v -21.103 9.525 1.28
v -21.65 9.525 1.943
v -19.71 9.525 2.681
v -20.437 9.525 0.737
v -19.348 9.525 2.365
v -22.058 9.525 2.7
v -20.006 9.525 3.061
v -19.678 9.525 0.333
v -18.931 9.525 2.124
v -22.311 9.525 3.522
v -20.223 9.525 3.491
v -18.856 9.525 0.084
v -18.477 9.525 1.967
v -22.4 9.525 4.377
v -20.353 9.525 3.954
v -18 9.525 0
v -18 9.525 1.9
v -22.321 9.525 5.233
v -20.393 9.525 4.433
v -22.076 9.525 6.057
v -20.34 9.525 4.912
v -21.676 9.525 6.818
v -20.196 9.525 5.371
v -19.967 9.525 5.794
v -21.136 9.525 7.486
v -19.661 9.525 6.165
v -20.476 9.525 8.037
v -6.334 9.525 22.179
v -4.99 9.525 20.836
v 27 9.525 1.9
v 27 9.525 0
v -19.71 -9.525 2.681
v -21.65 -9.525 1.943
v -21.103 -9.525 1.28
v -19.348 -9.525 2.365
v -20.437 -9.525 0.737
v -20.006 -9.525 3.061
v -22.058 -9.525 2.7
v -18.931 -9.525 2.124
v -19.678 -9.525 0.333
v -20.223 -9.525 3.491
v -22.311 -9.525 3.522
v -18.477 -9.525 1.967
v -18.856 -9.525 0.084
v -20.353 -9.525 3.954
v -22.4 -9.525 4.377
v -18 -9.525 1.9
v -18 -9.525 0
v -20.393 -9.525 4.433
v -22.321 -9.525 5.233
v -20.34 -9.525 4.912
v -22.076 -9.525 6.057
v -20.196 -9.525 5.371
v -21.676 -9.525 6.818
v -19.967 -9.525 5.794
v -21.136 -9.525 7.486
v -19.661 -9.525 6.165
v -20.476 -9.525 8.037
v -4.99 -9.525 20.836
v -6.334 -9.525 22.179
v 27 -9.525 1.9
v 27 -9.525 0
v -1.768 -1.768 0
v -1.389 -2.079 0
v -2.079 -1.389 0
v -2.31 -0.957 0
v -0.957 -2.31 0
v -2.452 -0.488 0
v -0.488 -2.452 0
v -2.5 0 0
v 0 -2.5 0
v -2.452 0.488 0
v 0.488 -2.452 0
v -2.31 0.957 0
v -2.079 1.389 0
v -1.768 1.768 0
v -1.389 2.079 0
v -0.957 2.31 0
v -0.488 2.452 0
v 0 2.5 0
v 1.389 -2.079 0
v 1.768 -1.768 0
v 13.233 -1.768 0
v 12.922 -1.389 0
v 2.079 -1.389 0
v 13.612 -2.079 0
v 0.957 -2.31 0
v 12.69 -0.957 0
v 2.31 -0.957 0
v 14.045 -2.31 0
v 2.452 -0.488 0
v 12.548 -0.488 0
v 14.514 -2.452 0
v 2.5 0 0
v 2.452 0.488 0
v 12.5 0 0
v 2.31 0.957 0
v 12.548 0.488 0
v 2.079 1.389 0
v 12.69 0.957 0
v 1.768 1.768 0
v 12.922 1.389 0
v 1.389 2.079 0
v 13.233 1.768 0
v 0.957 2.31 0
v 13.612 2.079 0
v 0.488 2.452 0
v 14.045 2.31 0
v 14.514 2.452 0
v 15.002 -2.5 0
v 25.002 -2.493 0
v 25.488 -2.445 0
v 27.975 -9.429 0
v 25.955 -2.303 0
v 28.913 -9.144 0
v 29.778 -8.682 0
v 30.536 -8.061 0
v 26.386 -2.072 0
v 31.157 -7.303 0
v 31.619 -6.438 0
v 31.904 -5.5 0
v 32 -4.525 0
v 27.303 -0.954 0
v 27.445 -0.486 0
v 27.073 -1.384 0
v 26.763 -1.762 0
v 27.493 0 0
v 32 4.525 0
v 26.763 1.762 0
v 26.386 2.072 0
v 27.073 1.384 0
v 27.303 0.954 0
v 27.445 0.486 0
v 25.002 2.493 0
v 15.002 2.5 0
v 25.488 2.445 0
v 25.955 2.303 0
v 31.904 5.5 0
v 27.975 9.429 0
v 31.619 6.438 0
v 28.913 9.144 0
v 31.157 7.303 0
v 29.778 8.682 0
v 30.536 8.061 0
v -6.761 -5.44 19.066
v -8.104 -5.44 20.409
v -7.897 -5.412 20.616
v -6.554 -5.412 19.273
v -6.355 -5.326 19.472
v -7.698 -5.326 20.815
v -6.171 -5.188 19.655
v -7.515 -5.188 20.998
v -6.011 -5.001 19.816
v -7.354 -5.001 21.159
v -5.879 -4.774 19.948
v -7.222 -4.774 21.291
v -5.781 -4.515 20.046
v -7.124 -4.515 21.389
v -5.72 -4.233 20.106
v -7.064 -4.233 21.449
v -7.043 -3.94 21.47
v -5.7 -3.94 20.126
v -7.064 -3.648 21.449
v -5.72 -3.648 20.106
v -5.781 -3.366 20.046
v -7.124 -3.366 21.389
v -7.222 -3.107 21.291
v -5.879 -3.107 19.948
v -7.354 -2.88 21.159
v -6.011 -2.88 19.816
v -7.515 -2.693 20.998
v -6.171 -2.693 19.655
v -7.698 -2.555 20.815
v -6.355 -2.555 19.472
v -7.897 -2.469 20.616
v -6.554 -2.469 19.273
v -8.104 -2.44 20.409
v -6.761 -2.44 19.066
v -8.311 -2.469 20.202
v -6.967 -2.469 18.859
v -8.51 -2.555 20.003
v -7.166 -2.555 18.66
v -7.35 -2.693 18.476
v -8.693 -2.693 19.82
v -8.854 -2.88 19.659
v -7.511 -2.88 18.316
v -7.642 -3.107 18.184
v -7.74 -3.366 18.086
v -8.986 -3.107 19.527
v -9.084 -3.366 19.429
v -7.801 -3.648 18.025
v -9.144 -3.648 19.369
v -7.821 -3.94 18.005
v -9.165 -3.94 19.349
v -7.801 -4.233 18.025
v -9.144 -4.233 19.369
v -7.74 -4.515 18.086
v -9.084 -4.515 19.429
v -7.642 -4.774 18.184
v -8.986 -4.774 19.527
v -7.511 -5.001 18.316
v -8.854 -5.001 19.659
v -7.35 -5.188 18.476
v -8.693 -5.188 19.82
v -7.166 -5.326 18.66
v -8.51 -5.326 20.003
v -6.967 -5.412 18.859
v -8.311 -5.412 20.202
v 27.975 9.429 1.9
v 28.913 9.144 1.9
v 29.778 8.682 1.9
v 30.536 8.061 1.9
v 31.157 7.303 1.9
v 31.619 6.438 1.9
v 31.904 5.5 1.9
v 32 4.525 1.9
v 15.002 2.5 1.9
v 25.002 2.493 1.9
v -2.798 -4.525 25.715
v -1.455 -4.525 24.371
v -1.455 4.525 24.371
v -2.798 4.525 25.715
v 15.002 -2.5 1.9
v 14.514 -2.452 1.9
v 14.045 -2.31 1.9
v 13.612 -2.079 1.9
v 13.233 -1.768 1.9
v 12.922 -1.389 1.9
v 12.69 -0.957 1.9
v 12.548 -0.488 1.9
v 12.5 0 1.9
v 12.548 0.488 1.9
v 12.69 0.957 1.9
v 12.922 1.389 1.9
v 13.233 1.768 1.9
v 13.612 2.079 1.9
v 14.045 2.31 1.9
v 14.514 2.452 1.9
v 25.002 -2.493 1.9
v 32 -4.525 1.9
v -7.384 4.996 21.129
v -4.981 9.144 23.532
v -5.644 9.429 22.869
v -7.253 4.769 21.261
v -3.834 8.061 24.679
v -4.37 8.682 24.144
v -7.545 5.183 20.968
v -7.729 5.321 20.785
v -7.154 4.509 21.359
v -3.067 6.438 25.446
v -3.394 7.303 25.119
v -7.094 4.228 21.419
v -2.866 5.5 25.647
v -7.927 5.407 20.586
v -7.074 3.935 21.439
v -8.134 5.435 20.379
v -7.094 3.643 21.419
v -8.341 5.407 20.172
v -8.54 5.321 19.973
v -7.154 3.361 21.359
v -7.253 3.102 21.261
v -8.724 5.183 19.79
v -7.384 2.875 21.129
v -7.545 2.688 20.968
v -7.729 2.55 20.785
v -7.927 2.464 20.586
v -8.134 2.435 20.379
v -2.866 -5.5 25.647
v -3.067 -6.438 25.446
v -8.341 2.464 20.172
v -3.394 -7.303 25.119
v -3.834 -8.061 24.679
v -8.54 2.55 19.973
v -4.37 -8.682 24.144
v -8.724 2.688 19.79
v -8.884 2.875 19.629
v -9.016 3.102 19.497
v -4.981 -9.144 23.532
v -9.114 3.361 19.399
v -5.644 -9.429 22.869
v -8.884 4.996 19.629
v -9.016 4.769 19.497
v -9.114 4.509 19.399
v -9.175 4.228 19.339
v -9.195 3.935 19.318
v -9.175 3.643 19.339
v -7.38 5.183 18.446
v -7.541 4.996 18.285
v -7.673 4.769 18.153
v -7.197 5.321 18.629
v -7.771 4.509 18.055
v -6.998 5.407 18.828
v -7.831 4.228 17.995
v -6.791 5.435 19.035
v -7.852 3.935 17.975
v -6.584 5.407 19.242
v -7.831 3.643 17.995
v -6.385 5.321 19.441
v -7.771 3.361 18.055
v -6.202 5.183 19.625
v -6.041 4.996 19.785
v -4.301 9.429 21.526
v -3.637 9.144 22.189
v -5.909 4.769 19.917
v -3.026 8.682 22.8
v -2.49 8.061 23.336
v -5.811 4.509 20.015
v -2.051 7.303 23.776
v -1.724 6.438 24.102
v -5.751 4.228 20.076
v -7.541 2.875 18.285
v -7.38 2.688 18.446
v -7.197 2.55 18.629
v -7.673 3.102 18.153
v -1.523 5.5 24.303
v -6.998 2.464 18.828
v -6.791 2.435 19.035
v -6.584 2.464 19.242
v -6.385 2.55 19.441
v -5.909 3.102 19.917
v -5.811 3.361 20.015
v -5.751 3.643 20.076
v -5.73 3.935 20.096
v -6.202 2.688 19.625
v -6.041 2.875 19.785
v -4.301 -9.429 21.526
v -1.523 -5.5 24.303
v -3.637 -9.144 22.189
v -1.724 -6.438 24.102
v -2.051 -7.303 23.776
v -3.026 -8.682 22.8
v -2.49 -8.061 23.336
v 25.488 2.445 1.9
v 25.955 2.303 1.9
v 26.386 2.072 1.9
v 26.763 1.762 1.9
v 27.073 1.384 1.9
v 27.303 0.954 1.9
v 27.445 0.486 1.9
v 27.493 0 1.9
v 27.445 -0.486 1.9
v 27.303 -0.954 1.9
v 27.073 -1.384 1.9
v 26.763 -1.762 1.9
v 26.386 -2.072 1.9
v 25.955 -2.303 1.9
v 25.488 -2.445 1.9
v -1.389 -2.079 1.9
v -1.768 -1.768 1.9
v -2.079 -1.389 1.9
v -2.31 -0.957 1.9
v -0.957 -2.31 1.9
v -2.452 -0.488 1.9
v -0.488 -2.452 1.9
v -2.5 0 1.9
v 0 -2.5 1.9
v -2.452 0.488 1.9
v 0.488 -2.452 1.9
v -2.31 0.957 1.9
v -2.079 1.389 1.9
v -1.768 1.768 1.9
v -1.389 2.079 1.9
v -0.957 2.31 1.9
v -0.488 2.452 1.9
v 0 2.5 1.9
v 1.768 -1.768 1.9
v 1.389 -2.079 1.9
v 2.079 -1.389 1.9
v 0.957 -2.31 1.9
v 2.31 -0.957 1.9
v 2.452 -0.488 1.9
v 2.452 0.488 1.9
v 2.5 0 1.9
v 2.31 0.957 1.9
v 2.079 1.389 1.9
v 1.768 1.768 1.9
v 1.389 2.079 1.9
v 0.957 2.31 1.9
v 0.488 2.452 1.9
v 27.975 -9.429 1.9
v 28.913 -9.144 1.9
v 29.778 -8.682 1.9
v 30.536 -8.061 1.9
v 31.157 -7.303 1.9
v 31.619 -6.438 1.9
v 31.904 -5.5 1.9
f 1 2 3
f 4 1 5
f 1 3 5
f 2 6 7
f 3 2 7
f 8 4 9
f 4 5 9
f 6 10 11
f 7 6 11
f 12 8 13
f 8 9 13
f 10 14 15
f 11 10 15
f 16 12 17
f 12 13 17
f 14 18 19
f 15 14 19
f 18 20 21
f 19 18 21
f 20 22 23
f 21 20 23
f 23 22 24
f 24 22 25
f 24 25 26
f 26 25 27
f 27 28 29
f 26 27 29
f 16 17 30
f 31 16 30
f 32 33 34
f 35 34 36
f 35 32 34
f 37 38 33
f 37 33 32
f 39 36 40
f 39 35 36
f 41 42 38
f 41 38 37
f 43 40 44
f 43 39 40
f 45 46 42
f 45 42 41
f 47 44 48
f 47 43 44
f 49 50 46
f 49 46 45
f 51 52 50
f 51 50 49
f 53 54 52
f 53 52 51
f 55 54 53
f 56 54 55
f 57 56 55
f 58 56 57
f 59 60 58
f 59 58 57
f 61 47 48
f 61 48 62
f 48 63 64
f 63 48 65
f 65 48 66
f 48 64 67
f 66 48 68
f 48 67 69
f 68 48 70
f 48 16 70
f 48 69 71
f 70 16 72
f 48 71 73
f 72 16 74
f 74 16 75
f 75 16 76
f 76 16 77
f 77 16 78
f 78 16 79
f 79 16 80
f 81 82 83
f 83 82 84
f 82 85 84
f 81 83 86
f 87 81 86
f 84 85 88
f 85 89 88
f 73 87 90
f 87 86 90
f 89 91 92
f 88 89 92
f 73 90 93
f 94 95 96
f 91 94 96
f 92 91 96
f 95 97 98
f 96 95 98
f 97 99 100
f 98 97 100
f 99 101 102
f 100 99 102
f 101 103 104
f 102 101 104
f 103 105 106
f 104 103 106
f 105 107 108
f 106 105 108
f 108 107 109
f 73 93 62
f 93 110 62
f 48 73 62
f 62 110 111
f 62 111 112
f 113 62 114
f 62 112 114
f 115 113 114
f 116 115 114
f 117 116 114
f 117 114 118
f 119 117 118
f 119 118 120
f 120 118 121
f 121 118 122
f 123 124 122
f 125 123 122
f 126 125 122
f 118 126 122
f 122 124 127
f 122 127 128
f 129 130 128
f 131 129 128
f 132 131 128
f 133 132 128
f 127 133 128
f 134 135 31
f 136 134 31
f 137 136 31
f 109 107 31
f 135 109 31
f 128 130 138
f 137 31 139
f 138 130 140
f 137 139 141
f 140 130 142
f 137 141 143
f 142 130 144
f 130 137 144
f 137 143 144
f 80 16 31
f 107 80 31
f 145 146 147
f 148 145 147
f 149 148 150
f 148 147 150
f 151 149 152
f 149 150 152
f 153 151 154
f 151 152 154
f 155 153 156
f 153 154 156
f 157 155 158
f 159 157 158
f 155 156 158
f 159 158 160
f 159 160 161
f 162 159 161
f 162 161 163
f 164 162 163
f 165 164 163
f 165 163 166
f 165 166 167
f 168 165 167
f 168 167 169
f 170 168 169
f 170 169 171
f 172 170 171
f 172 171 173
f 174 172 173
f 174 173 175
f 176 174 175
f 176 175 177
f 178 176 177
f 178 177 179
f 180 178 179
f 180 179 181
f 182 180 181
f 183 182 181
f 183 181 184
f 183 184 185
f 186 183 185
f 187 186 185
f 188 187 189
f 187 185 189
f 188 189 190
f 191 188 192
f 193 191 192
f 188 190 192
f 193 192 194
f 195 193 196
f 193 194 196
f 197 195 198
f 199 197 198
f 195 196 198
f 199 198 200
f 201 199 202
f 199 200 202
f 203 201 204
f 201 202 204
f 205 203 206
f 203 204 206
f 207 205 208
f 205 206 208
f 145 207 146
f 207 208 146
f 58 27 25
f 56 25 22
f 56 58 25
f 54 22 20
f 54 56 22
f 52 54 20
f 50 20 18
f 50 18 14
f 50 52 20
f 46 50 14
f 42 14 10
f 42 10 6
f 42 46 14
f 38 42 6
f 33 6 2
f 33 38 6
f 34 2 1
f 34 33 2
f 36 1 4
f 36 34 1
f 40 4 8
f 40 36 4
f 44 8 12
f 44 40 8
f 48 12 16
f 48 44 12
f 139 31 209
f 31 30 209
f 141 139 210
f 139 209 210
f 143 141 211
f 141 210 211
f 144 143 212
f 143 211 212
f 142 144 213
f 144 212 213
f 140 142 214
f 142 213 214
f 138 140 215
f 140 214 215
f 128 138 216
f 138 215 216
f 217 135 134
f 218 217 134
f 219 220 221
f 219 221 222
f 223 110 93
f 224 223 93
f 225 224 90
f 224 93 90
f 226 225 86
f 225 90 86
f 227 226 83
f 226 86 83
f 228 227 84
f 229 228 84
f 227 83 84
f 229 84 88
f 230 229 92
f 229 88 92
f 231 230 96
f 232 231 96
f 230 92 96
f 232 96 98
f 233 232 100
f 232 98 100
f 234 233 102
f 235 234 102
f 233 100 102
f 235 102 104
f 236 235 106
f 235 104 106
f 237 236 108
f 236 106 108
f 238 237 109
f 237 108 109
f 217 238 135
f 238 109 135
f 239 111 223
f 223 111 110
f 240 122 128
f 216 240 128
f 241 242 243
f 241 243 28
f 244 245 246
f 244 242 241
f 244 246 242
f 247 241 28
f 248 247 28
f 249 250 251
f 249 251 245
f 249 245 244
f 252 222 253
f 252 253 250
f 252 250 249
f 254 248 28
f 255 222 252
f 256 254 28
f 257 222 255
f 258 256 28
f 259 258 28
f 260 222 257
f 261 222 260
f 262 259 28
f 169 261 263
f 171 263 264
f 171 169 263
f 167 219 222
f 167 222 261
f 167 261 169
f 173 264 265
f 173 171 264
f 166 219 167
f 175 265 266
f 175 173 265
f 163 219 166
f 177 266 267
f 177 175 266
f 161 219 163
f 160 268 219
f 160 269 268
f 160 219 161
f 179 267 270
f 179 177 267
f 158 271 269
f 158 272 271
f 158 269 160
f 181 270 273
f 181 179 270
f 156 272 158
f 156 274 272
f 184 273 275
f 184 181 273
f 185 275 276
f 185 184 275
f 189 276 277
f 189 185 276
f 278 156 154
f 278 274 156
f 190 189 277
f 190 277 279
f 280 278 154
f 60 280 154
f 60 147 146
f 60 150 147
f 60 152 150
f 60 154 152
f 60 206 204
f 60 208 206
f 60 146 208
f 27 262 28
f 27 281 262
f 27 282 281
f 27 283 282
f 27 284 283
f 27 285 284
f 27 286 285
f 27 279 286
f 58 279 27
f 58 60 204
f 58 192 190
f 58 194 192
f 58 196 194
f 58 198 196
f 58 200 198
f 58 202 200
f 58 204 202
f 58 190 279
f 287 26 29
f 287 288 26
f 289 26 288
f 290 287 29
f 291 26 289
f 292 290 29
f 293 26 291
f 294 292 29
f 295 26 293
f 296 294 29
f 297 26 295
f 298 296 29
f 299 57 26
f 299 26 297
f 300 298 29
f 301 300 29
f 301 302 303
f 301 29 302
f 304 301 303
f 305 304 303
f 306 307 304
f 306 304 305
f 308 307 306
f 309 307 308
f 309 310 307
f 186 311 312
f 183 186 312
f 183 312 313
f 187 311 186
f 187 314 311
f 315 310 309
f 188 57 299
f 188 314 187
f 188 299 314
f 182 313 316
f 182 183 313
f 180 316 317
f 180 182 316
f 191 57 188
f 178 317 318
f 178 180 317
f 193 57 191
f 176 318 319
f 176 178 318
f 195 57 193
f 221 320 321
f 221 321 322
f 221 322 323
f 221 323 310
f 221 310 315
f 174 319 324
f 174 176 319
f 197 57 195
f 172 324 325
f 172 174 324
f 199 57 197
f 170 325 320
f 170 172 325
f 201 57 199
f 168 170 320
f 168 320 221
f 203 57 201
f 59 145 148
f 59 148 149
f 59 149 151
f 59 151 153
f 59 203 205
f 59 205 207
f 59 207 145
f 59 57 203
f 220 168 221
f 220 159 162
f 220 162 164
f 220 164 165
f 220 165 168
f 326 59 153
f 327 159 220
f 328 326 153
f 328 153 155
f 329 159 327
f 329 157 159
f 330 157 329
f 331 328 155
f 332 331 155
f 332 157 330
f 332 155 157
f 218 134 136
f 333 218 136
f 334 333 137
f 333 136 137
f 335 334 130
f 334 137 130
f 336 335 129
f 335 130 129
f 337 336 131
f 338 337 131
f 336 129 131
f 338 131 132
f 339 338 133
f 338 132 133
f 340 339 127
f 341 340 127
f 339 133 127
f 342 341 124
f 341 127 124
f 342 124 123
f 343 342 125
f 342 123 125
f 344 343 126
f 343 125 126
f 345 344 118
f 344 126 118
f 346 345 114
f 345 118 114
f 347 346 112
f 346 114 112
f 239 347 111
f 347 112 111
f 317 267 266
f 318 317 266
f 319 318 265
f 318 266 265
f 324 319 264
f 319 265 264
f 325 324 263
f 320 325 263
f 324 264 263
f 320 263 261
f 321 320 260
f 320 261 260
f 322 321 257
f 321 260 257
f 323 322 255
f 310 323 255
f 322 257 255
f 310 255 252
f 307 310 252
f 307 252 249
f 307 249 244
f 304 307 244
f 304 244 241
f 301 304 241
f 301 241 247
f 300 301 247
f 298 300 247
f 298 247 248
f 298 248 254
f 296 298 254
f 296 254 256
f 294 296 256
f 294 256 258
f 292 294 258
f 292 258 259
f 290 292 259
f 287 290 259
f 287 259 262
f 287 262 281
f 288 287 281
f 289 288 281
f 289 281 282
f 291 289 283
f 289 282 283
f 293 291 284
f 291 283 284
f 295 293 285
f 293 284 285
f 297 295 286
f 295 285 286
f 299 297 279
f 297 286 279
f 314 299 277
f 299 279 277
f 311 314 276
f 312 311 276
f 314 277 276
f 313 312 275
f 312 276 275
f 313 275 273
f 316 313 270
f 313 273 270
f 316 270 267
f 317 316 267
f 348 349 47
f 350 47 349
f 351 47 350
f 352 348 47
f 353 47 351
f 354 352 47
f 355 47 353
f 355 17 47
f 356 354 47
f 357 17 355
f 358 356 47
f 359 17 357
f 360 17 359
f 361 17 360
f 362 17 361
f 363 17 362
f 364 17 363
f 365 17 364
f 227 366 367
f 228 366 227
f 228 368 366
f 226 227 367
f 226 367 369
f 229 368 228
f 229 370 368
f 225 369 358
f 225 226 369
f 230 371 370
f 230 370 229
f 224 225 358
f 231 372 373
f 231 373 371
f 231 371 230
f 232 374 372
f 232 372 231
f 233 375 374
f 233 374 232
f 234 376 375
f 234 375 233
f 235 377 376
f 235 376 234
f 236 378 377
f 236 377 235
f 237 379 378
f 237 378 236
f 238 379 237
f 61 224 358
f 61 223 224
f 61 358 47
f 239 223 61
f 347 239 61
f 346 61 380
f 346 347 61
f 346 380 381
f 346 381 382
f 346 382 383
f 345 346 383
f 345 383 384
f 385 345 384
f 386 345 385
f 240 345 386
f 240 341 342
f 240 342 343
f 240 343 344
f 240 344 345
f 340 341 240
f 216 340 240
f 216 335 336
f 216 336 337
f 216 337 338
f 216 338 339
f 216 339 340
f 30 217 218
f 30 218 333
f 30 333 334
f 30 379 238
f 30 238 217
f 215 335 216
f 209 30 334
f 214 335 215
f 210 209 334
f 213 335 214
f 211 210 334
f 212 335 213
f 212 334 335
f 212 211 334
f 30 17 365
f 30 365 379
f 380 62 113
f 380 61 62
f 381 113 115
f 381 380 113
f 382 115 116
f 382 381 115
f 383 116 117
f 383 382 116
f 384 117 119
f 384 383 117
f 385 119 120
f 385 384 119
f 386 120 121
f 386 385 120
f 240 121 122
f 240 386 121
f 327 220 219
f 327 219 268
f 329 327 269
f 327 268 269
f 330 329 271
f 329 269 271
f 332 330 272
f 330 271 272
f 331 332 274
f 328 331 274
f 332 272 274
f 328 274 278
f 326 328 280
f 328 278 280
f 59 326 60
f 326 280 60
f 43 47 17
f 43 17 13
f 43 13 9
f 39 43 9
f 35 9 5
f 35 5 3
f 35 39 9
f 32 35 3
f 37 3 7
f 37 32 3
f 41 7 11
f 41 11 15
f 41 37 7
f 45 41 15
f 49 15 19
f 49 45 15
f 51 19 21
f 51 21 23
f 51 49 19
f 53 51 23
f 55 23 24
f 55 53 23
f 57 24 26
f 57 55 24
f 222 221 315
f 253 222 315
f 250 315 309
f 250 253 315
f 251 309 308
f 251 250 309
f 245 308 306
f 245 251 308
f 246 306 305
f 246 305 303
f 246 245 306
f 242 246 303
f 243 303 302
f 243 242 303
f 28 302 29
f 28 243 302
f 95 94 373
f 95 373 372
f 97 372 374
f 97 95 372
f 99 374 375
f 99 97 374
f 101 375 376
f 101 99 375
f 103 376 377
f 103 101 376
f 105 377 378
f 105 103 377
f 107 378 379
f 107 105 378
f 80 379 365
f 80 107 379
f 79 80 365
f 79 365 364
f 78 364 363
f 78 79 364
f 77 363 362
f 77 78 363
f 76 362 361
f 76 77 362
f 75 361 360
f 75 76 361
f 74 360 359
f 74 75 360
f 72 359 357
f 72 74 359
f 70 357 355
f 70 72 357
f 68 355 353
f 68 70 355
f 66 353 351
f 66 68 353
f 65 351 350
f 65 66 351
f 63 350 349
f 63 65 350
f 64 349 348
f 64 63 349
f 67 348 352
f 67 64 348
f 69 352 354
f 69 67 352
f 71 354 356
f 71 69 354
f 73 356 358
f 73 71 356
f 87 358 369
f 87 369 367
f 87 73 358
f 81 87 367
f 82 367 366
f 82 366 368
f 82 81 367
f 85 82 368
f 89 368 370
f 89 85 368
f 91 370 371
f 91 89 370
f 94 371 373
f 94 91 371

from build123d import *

# Parameters (mm, degrees)
F0_W     = 50
F0_H     = 19.05
F0_R     = 2.5
F1_DEPTH = 1.9
F2_R     = 5
F4_DEPTH = 19.05
F5_R     = 5
F6_R     = 1.5
F7_DEPTH = 5


with BuildPart() as f1:
    # F0 (on Top) → F1 (new body)
    with BuildSketch(Plane.XY):
        with Locations((7, 0)):
            Rectangle(F0_W, F0_H)
        Circle(F0_R, mode=Mode.SUBTRACT)
        with BuildLine():
            ThreePointArc((25.0017541021, 2.4929631711), (26.7634116596, 1.762171322), (27.4929637882, 0))
            ThreePointArc((27.4929637882, 0), (26.7634116596, -1.762171322), (25.0017541021, -2.4929631711))
            Line((25.0017541021, -2.4929631711), (15.0017590529, -2.4999993811))
            ThreePointArc((15.0017590529, -2.4999993811), (12.5, 0), (15.0017590529, 2.4999993811))
            Line((15.0017590529, 2.4999993811), (25.0017541021, 2.4929631711))
        make_face(mode=Mode.SUBTRACT)
    extrude(amount=F1_DEPTH)

    # F2
    f2_edges = [f1.edges().sort_by_distance(p)[0] for p in [
        (32, -9.525, 0.95),
        (32, 9.525, 0.95),
    ]]
    fillet(f2_edges, radius=F2_R)

    # F3 (on face) → F4 (join)
    with BuildSketch(Plane.XZ.offset(9.525)):
        with BuildLine():
            Line((-2.7983656003, 25.7148731307), (-20.47603513, 8.037203601))
            ThreePointArc((-20.47603513, 8.037203601), (-22.2049789443, 3.1045649079), (-18, 0))
            Line((-18, 0), (-18, 1.9))
            ThreePointArc((-18, 1.9), (-20.2226399871, 3.4906627434), (-19.6607572738, 6.1654756887))
            Line((-19.6607572738, 6.1654756887), (-1.454862716, 24.3713702464))
            Line((-1.454862716, 24.3713702464), (-2.7983656003, 25.7148731307))
        make_face()
    extrude(amount=-F4_DEPTH)

    # F5
    f5_edges = [f1.edges().sort_by_distance(p)[0] for p in [
        (-2.126614, -9.525, 25.043122),
        (-2.126614, 9.525, 25.043122),
    ]]
    fillet(f5_edges, radius=F5_R)

    # F6 (on face) → F7 (cut)
    with BuildSketch(Plane(origin=(-14.2566193655, 0, 14.2566193655), x_dir=(0, -1, 0), z_dir=(-0.7071067812, 0, 0.7071067812))):
        with Locations((-3.9354462066, 8.6580958872)):
            Circle(F6_R)
        with Locations((3.9404836009, 8.701013138)):
            Circle(F6_R)
    extrude(amount=-F7_DEPTH, mode=Mode.SUBTRACT)


solid = f1.part
